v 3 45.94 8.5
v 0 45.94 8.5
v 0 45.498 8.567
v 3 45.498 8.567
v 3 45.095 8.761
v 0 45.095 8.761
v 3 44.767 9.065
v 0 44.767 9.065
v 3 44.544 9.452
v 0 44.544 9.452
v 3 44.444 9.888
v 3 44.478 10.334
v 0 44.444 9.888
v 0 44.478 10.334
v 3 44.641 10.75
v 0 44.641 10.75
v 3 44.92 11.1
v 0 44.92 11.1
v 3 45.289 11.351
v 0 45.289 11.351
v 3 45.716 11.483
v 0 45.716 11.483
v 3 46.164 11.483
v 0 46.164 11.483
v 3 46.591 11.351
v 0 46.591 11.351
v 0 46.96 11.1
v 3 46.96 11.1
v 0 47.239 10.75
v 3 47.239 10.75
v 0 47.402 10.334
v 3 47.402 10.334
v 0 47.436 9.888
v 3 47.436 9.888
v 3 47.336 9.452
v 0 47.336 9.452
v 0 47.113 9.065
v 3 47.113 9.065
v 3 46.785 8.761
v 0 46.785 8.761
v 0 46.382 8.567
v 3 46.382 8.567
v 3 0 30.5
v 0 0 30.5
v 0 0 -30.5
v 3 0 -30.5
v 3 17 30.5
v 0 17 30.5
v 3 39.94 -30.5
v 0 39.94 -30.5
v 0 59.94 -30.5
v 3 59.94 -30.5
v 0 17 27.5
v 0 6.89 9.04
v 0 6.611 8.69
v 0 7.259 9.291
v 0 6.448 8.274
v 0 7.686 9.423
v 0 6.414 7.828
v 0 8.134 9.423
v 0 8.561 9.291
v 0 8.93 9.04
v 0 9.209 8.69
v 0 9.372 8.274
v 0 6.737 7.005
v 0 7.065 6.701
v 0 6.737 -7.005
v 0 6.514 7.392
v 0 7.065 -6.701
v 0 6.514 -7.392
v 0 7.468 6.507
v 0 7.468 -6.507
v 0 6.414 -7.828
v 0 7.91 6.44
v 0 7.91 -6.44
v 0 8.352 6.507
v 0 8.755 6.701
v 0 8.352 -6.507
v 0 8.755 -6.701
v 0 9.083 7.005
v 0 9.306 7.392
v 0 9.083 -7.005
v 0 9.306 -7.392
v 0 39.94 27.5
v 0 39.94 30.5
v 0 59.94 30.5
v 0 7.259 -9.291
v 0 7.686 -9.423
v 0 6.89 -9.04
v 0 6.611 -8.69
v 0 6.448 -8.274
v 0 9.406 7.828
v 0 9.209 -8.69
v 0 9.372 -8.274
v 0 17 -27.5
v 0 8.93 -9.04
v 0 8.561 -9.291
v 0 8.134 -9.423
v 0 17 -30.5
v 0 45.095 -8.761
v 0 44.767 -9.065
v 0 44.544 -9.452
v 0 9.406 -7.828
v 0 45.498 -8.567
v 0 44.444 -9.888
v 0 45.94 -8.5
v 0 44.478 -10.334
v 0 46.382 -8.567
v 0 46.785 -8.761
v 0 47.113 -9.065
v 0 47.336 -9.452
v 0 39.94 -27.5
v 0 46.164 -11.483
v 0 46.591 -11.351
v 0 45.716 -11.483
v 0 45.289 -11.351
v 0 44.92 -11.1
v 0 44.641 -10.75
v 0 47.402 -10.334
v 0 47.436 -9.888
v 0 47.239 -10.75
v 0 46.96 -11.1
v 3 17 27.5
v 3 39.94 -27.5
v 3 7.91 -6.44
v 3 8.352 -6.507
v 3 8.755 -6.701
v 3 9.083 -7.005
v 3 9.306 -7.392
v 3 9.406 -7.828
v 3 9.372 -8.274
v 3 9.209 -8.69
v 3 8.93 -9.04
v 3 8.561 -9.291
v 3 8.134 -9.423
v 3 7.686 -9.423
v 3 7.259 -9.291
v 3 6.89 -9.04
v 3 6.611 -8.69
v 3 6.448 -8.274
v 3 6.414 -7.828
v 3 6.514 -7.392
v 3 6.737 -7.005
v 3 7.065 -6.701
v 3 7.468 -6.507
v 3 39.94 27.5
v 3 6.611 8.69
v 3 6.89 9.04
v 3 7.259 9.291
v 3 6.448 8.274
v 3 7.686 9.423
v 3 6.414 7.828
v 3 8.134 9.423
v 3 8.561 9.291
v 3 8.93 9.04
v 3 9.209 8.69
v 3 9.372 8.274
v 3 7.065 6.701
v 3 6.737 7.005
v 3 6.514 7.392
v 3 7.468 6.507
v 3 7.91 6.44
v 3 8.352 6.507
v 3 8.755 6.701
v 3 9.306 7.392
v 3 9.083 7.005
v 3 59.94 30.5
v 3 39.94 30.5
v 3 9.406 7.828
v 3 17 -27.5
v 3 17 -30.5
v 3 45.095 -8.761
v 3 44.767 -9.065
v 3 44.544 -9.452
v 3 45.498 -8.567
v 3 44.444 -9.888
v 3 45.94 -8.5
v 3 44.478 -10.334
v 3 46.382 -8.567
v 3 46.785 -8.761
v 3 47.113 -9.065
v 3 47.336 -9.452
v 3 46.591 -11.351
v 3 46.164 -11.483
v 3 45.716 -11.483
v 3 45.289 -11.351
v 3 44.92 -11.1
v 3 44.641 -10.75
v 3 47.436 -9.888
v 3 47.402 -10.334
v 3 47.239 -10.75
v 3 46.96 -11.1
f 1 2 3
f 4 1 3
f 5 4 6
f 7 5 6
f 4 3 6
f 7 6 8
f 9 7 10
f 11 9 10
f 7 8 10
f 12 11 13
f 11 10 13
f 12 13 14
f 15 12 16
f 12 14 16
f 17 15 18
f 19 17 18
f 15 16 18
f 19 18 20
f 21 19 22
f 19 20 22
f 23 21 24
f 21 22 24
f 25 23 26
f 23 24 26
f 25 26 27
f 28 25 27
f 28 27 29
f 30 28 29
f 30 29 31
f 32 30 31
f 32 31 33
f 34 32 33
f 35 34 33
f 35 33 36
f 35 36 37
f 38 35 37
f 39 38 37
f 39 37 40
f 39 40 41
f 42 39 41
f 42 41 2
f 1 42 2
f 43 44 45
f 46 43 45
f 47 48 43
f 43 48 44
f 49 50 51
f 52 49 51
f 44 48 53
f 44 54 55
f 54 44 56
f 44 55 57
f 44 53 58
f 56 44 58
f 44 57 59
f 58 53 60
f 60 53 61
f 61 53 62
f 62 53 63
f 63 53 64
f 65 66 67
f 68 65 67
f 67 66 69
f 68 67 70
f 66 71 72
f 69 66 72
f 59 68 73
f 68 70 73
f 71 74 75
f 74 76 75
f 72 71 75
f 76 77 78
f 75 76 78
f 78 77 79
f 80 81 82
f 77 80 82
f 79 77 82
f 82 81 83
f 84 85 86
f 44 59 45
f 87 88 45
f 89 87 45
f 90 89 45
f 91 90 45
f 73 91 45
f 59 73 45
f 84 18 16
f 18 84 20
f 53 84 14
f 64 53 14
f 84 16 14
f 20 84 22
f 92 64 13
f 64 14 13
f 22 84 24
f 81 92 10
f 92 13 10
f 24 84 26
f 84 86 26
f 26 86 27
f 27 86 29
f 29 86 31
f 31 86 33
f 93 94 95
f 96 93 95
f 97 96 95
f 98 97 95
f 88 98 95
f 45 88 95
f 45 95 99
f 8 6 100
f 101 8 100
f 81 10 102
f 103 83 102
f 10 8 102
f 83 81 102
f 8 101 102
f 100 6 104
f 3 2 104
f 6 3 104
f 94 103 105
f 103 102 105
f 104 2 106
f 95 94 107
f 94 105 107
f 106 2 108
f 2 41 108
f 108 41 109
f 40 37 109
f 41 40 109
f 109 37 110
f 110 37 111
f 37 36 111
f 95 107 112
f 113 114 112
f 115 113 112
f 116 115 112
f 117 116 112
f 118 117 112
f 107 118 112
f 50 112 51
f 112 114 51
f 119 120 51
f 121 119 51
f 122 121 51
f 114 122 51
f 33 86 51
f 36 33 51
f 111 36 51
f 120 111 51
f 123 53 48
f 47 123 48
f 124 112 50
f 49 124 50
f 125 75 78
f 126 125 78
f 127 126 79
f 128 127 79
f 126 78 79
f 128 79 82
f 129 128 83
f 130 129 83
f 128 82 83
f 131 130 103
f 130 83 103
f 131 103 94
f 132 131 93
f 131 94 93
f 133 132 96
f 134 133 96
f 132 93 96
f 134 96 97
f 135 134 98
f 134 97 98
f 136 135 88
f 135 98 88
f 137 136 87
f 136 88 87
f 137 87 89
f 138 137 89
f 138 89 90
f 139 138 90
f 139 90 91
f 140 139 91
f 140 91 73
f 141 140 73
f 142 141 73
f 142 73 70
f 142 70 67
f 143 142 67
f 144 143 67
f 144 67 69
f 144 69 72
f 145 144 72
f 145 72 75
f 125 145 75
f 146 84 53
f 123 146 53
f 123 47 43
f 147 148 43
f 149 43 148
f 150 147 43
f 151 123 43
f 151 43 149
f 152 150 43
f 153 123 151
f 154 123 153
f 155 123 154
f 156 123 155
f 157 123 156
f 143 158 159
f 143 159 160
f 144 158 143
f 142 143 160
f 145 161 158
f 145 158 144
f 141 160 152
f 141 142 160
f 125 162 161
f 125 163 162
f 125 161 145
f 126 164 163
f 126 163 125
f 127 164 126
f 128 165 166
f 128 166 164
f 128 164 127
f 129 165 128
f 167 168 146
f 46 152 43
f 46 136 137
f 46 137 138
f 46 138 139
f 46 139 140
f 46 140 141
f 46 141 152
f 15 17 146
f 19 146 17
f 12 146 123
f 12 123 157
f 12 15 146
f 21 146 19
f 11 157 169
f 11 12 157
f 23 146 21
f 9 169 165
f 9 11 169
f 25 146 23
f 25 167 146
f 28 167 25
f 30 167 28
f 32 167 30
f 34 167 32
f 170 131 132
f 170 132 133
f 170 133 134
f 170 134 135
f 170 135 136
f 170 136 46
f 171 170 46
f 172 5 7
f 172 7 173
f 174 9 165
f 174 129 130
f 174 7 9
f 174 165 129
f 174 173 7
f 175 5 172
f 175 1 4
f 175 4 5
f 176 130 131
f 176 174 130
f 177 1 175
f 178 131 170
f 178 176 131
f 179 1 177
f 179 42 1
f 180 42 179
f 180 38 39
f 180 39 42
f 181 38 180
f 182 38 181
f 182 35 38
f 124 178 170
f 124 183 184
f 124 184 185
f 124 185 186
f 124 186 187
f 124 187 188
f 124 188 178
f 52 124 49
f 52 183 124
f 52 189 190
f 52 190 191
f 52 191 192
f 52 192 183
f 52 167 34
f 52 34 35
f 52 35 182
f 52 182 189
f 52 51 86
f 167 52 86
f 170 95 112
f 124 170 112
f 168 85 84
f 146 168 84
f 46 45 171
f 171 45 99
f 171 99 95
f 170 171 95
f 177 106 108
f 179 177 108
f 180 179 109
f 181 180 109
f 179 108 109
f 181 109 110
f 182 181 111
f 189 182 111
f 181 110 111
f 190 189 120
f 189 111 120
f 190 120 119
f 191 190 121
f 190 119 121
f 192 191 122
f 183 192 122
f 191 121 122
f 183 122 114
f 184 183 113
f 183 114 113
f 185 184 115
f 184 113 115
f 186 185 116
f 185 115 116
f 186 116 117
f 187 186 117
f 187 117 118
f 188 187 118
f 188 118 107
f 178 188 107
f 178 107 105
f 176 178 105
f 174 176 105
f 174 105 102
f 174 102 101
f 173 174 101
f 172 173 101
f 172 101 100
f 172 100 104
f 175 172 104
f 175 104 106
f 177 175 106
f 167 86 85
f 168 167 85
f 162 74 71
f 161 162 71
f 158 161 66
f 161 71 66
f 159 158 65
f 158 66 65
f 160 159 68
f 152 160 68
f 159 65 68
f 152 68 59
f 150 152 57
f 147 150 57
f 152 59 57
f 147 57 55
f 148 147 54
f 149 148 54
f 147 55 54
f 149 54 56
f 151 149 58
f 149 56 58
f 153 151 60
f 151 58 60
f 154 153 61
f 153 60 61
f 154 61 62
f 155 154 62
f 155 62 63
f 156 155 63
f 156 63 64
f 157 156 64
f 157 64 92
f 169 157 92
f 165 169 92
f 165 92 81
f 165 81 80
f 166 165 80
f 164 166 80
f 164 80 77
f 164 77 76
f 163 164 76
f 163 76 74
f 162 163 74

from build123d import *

# Parameters (mm, degrees)
BOSS_EXTRUDE1_DEPTH   = 3
CROQUIS1_R            = 1.5
CORTAR_EXTRUIR1_DEPTH = 10


with BuildPart() as part:
    # Sketch1 → Boss-Extrude1 (new body)
    with BuildSketch(Plane(origin=(0, 0, 0), x_dir=(0, 0, -1), z_dir=(1, 0, 0))):
        Polygon((-27.5, 0), (27.5, 0), (30.5, 0), (30.5, 17), (27.5, 17), (27.5, 39.94), (30.5, 39.94), (30.5, 59.94), (27.5, 59.94), (-27.5, 59.94), (-30.5, 59.94), (-30.5, 39.94), (-27.5, 39.94), (-27.5, 17), (-30.5, 17), (-30.5, 0), align=None)
    extrude(amount=BOSS_EXTRUDE1_DEPTH)

    # Croquis1 → Cortar-Extruir1 (cut)
    with BuildSketch(Plane.ZY):
        with Locations((-7.94, 7.91)):
            Circle(CROQUIS1_R)
        with Locations(Location((7.94, 7.91, 0), (0, 0, 180))):
            Circle(CROQUIS1_R)
        with Locations((-10, 45.94)):
            Circle(CROQUIS1_R)
        with Locations(Location((10, 45.94, 0), (0, 0, 180))):
            Circle(CROQUIS1_R)
    extrude(amount=-CORTAR_EXTRUIR1_DEPTH, mode=Mode.SUBTRACT)


solid = part.part
